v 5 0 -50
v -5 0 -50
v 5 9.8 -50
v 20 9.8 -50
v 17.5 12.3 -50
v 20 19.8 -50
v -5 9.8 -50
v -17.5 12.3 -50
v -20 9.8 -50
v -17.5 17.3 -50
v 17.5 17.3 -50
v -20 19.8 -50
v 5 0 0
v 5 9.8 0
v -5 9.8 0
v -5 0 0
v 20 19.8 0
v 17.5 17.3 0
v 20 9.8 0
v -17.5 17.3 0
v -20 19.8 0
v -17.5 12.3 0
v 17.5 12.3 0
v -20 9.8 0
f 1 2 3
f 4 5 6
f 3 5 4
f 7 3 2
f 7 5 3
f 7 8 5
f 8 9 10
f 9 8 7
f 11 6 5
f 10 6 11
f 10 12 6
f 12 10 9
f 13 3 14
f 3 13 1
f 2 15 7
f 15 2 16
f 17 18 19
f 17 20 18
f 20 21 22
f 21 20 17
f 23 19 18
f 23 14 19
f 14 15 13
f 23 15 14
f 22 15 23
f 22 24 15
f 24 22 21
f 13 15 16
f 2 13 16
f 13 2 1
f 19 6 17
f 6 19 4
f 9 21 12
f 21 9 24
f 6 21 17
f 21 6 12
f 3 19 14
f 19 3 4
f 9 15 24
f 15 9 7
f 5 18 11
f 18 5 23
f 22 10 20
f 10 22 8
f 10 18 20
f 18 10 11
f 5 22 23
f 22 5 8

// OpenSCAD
/*[Blade generator for sandpaper handler]*/

// Length of the blade:
BladeLength = 10;
// Radius for cylindrical blade (minimum 8):
BladeRadius = 16;
// Height for Ortho blade (minimum 10):
BladeHeight = 40;
// Hollow:
Hollow = 1; // [0:Fill, 1:Hollow]

// End type:
EndType=5; // [1:Round, 2:Chamfer, 3:Flat, 4:Cylindrical, 5:Ortho]

module MakeBlade()
{
    if (EndType==1)
        rotate([90,0,0])
        union()
        {
        cube([10,50,BladeLength]);
        translate([5,0,BladeLength])
            rotate([-90,0,0])
                cylinder(h=50,r=5,$fn=50);
        }
        
    if (EndType==2)
        rotate([0,90,180])
        difference()
        {
        cube([10,50,BladeLength]);
        translate([-10,-5,BladeLength-6])
            rotate([0,45,0])
                cube([10,60,20]);
        }

    if (EndType==3)
        cube([50,BladeLength,10]);

    if (EndType==4)
        rotate([0,90,0])
        difference()
        {
            union()
            {
            translate([0,0,-5])
                cube([50,12,10]);
            translate([0,BladeRadius+9,0])
                rotate([0,90,0])
                cylinder(h=50,r=BladeRadius,$fn=50);
                
            }
        if(Hollow>0)
        translate([-5,BladeRadius+9,0])
            rotate([0,90,0])
            cylinder(h=60,r=BladeRadius-4,$fn=50);
            
        }

    if (EndType==5)
        rotate([0,90,0])
        difference()
        {
            union()
            {
            translate([0,0,-5])
                cube([50,10,10]);
            translate([0,9.8,-BladeHeight/2])
                cube([50,BladeLength,BladeHeight]);
            }
        if(Hollow>0)
            translate([-5,9.8+(BladeLength-(BladeLength-5))/2,-(BladeHeight-5)/2])
                cube([60,BladeLength-5,BladeHeight-5]);
        }
}

// Main
MakeBlade();
